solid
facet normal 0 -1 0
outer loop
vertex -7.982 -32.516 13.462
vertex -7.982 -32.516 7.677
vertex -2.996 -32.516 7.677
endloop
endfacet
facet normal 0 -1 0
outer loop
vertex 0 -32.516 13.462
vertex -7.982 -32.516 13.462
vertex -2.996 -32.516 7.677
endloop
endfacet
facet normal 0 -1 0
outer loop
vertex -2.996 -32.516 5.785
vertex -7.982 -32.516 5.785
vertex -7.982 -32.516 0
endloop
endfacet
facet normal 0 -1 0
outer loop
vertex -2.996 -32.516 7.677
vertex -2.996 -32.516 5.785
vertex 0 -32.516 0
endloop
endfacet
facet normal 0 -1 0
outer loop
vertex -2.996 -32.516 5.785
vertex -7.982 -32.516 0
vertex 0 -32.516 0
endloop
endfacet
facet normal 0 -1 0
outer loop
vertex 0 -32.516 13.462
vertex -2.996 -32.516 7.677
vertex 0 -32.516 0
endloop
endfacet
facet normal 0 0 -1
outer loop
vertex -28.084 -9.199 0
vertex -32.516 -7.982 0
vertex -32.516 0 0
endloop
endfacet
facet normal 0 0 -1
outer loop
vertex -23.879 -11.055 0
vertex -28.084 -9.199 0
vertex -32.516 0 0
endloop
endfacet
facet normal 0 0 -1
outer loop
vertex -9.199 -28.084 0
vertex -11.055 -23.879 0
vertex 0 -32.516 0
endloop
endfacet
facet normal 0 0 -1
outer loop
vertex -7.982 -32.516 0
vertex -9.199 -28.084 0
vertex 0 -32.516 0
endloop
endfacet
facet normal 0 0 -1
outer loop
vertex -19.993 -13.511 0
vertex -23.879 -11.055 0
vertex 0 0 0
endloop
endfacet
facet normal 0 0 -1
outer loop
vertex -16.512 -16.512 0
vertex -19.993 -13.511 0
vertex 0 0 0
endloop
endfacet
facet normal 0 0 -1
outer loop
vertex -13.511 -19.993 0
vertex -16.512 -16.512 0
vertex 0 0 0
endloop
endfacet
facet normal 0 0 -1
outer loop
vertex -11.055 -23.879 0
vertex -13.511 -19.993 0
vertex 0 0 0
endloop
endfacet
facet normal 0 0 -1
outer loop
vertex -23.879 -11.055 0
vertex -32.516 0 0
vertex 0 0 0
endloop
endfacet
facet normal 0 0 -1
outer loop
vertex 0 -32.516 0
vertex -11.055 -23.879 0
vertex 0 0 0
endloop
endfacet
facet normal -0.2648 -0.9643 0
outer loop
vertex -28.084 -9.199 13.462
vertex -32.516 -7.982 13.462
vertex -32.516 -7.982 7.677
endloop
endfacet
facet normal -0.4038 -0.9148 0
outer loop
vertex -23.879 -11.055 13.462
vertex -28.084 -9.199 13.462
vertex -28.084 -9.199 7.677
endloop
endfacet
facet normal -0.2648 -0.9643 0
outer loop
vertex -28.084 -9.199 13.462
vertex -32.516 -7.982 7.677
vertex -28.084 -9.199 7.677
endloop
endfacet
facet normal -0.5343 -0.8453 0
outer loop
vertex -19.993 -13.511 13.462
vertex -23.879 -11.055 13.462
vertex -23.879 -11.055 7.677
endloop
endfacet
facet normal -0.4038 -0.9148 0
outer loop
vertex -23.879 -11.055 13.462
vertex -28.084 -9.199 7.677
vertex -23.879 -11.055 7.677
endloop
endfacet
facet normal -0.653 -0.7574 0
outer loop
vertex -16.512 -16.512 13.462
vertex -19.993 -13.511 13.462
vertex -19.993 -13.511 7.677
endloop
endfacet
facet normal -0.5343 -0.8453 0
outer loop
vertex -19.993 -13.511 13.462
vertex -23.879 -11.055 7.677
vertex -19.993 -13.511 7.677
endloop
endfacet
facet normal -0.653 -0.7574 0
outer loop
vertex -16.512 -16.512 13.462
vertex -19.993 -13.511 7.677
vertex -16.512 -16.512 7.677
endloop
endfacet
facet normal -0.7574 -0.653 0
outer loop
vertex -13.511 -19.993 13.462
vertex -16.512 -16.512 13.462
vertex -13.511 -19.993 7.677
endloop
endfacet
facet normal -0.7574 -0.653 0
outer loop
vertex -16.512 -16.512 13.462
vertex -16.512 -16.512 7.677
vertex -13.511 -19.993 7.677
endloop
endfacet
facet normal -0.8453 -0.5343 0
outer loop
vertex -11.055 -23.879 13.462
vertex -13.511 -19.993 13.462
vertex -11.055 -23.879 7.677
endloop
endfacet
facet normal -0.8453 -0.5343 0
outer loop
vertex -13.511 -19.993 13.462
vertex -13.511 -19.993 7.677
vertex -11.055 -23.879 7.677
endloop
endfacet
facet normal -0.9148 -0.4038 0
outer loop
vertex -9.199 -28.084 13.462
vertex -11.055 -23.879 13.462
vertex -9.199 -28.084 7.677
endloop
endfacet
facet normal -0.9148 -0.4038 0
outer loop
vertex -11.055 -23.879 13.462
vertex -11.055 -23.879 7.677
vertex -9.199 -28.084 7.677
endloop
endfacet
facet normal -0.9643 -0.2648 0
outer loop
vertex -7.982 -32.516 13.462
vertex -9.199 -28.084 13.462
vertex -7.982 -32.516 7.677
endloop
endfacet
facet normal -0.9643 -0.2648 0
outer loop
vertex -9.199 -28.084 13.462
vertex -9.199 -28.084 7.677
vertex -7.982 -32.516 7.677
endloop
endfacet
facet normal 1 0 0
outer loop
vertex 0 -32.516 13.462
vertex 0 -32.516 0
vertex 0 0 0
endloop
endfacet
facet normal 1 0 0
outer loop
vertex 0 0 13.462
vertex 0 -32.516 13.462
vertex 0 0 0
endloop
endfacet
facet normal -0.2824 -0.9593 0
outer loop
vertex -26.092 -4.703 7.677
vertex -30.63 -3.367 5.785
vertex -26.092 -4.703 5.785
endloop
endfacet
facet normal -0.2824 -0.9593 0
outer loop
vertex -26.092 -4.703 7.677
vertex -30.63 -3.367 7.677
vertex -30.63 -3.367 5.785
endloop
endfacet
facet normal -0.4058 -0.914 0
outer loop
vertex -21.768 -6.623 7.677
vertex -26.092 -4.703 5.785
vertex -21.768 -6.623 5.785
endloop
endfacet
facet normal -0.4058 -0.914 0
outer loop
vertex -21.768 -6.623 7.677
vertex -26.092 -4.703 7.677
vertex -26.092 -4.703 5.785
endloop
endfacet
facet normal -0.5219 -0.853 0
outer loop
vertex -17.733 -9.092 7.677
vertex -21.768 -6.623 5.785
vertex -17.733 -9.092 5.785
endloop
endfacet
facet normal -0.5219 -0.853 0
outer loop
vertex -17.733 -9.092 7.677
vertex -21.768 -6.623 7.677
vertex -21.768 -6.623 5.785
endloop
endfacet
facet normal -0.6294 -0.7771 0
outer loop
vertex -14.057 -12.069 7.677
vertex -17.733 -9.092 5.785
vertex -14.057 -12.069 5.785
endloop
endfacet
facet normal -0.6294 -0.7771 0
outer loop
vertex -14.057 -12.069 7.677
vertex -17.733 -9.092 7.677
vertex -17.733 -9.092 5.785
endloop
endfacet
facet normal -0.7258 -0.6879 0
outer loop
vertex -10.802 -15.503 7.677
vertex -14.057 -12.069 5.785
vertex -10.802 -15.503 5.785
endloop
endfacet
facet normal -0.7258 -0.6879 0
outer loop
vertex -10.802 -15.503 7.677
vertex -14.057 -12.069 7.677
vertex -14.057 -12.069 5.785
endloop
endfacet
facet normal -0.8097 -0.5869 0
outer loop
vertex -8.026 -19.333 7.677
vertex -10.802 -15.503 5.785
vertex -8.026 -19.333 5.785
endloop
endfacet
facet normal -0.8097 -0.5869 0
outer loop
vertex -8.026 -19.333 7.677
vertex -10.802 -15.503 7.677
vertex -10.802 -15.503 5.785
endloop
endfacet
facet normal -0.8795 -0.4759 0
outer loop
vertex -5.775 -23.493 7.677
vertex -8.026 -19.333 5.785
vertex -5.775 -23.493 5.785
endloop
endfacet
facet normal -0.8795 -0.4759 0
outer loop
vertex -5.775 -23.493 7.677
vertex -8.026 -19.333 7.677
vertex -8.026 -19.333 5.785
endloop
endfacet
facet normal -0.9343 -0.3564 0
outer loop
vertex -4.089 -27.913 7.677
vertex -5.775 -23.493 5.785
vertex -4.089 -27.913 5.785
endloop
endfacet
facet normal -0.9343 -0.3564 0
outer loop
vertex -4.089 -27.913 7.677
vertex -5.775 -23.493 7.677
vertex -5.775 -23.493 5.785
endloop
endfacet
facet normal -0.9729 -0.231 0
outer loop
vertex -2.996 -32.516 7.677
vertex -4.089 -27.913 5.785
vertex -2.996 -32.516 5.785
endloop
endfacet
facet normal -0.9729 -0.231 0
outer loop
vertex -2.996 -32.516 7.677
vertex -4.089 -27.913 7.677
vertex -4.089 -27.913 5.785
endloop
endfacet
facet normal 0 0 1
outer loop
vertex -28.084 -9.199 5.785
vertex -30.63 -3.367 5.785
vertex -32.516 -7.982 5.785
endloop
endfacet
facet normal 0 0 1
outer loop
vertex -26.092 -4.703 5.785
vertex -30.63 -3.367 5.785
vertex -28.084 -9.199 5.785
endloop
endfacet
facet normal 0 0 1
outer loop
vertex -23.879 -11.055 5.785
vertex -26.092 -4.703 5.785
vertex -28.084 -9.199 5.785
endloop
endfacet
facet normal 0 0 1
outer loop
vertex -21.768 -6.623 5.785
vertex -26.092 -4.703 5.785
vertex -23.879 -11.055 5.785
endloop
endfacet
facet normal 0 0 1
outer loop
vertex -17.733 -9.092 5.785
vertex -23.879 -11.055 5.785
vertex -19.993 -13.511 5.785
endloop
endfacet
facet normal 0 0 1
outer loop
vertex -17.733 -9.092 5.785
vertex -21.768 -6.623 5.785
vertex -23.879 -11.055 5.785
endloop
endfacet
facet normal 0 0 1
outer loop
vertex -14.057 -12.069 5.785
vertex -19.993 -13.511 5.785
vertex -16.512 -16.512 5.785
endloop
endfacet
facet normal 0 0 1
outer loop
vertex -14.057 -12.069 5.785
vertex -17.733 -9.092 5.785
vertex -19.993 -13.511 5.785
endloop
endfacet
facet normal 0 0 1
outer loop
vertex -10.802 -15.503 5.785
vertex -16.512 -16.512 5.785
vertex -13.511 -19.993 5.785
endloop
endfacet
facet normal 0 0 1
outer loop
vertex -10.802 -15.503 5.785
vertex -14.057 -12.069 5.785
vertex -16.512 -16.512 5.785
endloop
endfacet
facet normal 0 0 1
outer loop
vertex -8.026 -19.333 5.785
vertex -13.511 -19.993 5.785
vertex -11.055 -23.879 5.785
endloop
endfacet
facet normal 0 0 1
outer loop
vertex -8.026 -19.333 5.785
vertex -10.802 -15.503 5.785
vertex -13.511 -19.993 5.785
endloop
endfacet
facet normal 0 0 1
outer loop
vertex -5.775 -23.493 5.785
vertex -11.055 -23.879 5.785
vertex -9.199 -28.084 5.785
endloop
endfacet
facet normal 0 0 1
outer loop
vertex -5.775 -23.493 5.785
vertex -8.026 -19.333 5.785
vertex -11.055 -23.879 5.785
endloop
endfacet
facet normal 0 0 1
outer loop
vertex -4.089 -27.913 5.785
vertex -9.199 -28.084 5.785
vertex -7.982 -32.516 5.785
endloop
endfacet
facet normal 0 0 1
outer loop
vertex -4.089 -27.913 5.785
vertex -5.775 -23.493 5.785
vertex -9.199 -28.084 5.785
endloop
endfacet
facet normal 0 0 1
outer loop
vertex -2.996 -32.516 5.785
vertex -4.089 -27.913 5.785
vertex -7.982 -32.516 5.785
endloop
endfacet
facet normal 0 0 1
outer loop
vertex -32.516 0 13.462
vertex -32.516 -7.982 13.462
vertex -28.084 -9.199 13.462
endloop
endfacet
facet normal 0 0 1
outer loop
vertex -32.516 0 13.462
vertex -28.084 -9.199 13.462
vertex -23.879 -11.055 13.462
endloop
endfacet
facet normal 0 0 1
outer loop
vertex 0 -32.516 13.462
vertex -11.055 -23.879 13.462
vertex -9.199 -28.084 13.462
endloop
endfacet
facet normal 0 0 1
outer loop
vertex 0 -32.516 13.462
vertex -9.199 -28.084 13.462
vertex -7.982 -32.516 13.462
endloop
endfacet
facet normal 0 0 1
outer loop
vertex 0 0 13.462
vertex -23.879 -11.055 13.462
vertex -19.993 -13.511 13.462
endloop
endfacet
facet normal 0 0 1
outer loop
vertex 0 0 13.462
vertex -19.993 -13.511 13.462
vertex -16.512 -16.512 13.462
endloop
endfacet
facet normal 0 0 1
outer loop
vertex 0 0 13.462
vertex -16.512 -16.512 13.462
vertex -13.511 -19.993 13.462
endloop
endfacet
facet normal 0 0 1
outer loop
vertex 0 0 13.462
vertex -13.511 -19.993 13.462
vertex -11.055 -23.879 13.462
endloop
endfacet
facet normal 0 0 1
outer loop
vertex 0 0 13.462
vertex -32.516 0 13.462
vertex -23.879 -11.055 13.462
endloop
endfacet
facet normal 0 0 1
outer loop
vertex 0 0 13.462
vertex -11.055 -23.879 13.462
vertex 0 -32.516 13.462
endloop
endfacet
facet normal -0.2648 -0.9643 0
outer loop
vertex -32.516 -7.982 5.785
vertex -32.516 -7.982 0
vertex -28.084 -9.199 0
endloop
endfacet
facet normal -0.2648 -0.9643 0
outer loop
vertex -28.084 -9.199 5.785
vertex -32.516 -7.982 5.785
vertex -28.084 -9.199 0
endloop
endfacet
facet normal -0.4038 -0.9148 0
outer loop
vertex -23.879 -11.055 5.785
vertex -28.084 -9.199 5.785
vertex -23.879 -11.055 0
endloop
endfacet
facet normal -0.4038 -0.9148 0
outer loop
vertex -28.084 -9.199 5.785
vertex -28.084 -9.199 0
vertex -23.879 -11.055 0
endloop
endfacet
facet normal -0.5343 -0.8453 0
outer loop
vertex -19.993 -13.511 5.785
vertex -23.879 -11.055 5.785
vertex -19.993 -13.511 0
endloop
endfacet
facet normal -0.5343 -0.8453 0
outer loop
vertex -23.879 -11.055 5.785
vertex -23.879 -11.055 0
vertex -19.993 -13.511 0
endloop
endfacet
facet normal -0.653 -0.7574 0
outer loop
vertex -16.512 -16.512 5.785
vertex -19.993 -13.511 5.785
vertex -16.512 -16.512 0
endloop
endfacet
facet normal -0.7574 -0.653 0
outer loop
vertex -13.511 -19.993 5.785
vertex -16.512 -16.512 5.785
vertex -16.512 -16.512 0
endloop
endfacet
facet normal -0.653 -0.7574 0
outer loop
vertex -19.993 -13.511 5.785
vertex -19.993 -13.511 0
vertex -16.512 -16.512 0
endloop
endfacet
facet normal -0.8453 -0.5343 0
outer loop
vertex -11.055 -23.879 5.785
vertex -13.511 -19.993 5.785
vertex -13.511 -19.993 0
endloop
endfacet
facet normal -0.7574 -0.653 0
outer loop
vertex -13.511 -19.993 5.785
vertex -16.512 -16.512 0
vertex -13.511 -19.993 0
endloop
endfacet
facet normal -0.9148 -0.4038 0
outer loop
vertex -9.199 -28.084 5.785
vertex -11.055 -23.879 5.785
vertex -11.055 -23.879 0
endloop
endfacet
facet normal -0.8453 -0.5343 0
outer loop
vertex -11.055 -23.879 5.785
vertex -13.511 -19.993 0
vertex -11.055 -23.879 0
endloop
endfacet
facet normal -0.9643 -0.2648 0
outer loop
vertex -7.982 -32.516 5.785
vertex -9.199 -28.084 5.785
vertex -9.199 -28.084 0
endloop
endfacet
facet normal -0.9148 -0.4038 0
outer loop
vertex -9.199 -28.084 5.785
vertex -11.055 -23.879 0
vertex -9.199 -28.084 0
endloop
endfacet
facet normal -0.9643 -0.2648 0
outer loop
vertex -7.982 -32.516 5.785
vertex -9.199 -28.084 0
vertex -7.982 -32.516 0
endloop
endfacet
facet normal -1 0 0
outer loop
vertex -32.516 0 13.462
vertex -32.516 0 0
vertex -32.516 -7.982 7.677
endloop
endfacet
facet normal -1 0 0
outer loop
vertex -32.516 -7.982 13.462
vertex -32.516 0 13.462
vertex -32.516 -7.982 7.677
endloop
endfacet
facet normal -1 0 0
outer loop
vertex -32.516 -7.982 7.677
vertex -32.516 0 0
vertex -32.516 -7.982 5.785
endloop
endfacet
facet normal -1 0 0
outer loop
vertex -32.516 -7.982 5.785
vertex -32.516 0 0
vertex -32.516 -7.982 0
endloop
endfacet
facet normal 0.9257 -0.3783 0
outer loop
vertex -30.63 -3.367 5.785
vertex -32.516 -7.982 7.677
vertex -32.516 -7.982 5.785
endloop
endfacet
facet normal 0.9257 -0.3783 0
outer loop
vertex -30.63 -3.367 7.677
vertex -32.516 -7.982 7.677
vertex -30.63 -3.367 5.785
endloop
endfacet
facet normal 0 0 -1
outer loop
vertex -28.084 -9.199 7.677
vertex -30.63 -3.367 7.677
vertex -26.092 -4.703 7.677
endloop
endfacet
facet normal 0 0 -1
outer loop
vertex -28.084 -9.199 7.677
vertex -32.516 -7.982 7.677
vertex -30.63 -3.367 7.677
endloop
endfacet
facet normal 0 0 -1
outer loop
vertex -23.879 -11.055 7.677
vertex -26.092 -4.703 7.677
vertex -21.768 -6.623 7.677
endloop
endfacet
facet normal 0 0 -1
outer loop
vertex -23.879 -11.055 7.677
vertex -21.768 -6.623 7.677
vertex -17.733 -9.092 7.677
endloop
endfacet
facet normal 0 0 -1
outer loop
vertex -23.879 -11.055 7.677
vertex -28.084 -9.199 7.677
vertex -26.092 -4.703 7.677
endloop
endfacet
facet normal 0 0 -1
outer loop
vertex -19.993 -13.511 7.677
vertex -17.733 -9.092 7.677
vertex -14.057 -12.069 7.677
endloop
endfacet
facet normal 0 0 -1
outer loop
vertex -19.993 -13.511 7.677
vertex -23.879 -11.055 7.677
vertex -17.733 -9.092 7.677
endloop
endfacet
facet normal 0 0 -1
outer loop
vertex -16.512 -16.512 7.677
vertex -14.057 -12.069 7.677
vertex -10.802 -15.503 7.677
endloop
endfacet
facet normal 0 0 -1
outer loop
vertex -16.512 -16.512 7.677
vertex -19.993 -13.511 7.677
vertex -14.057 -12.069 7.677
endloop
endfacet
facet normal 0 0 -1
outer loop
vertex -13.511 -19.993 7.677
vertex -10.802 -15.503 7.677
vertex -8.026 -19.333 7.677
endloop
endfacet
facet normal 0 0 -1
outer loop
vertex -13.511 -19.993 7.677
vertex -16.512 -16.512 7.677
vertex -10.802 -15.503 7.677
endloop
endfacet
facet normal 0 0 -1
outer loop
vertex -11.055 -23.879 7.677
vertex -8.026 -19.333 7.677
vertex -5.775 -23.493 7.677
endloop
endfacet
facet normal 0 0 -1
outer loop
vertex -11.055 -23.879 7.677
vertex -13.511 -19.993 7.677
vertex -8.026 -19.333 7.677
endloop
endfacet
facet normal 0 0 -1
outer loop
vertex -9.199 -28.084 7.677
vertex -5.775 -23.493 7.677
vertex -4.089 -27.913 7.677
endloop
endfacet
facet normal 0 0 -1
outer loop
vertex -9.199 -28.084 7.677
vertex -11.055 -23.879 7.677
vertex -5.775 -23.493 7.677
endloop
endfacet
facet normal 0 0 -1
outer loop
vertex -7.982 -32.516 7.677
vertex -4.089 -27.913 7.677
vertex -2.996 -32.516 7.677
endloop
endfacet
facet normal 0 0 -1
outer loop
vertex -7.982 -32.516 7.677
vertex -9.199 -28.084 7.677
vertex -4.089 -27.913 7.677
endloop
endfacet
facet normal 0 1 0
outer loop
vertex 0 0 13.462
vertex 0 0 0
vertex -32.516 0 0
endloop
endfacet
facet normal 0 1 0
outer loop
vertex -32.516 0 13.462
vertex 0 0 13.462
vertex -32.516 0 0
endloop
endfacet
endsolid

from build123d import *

# Parameters (mm, degrees)
F1_DEPTH = 13.462
F2_W     = 4.9854009032
F2_H     = 1.8919831465


with BuildPart() as f1:
    # F0 (on Top) → F1 (new body)
    with BuildSketch(Plane.XY):
        with BuildLine():
            Line((0, 0), (-32.5159132481, 0))
            Line((-32.5159132481, 0), (-32.5159132481, -7.981837922))
            ThreePointArc((-32.5159132481, -7.981837922), (-16.5119812517, -16.5119812517), (-7.981837922, -32.5159132481))
            Line((-7.981837922, -32.5159132481), (0, -32.5159132481))
            Line((0, -32.5159132481), (0, 0))
        make_face()
    extrude(amount=F1_DEPTH)

    # F3: sweep along a path in F3_path
    with BuildLine(Plane(origin=(-32.5159132481, -7.981837922, 13.462), x_dir=(0, 1, 0), z_dir=(0, 0, 1))) as f3_path:
        ThreePointArc((0, 0), (-8.5301433298, -16.0039319963), (-24.5340753261, -24.5340753261))
    # F2 (on face) → F3 (sweep, cut)
    with BuildSketch(Plane.XZ.offset(32.5159132481)):
        with Locations((-5.4891374703, 6.731)):
            Rectangle(F2_W, F2_H)
    sweep(path=f3_path.line, mode=Mode.SUBTRACT)


solid = f1.part
